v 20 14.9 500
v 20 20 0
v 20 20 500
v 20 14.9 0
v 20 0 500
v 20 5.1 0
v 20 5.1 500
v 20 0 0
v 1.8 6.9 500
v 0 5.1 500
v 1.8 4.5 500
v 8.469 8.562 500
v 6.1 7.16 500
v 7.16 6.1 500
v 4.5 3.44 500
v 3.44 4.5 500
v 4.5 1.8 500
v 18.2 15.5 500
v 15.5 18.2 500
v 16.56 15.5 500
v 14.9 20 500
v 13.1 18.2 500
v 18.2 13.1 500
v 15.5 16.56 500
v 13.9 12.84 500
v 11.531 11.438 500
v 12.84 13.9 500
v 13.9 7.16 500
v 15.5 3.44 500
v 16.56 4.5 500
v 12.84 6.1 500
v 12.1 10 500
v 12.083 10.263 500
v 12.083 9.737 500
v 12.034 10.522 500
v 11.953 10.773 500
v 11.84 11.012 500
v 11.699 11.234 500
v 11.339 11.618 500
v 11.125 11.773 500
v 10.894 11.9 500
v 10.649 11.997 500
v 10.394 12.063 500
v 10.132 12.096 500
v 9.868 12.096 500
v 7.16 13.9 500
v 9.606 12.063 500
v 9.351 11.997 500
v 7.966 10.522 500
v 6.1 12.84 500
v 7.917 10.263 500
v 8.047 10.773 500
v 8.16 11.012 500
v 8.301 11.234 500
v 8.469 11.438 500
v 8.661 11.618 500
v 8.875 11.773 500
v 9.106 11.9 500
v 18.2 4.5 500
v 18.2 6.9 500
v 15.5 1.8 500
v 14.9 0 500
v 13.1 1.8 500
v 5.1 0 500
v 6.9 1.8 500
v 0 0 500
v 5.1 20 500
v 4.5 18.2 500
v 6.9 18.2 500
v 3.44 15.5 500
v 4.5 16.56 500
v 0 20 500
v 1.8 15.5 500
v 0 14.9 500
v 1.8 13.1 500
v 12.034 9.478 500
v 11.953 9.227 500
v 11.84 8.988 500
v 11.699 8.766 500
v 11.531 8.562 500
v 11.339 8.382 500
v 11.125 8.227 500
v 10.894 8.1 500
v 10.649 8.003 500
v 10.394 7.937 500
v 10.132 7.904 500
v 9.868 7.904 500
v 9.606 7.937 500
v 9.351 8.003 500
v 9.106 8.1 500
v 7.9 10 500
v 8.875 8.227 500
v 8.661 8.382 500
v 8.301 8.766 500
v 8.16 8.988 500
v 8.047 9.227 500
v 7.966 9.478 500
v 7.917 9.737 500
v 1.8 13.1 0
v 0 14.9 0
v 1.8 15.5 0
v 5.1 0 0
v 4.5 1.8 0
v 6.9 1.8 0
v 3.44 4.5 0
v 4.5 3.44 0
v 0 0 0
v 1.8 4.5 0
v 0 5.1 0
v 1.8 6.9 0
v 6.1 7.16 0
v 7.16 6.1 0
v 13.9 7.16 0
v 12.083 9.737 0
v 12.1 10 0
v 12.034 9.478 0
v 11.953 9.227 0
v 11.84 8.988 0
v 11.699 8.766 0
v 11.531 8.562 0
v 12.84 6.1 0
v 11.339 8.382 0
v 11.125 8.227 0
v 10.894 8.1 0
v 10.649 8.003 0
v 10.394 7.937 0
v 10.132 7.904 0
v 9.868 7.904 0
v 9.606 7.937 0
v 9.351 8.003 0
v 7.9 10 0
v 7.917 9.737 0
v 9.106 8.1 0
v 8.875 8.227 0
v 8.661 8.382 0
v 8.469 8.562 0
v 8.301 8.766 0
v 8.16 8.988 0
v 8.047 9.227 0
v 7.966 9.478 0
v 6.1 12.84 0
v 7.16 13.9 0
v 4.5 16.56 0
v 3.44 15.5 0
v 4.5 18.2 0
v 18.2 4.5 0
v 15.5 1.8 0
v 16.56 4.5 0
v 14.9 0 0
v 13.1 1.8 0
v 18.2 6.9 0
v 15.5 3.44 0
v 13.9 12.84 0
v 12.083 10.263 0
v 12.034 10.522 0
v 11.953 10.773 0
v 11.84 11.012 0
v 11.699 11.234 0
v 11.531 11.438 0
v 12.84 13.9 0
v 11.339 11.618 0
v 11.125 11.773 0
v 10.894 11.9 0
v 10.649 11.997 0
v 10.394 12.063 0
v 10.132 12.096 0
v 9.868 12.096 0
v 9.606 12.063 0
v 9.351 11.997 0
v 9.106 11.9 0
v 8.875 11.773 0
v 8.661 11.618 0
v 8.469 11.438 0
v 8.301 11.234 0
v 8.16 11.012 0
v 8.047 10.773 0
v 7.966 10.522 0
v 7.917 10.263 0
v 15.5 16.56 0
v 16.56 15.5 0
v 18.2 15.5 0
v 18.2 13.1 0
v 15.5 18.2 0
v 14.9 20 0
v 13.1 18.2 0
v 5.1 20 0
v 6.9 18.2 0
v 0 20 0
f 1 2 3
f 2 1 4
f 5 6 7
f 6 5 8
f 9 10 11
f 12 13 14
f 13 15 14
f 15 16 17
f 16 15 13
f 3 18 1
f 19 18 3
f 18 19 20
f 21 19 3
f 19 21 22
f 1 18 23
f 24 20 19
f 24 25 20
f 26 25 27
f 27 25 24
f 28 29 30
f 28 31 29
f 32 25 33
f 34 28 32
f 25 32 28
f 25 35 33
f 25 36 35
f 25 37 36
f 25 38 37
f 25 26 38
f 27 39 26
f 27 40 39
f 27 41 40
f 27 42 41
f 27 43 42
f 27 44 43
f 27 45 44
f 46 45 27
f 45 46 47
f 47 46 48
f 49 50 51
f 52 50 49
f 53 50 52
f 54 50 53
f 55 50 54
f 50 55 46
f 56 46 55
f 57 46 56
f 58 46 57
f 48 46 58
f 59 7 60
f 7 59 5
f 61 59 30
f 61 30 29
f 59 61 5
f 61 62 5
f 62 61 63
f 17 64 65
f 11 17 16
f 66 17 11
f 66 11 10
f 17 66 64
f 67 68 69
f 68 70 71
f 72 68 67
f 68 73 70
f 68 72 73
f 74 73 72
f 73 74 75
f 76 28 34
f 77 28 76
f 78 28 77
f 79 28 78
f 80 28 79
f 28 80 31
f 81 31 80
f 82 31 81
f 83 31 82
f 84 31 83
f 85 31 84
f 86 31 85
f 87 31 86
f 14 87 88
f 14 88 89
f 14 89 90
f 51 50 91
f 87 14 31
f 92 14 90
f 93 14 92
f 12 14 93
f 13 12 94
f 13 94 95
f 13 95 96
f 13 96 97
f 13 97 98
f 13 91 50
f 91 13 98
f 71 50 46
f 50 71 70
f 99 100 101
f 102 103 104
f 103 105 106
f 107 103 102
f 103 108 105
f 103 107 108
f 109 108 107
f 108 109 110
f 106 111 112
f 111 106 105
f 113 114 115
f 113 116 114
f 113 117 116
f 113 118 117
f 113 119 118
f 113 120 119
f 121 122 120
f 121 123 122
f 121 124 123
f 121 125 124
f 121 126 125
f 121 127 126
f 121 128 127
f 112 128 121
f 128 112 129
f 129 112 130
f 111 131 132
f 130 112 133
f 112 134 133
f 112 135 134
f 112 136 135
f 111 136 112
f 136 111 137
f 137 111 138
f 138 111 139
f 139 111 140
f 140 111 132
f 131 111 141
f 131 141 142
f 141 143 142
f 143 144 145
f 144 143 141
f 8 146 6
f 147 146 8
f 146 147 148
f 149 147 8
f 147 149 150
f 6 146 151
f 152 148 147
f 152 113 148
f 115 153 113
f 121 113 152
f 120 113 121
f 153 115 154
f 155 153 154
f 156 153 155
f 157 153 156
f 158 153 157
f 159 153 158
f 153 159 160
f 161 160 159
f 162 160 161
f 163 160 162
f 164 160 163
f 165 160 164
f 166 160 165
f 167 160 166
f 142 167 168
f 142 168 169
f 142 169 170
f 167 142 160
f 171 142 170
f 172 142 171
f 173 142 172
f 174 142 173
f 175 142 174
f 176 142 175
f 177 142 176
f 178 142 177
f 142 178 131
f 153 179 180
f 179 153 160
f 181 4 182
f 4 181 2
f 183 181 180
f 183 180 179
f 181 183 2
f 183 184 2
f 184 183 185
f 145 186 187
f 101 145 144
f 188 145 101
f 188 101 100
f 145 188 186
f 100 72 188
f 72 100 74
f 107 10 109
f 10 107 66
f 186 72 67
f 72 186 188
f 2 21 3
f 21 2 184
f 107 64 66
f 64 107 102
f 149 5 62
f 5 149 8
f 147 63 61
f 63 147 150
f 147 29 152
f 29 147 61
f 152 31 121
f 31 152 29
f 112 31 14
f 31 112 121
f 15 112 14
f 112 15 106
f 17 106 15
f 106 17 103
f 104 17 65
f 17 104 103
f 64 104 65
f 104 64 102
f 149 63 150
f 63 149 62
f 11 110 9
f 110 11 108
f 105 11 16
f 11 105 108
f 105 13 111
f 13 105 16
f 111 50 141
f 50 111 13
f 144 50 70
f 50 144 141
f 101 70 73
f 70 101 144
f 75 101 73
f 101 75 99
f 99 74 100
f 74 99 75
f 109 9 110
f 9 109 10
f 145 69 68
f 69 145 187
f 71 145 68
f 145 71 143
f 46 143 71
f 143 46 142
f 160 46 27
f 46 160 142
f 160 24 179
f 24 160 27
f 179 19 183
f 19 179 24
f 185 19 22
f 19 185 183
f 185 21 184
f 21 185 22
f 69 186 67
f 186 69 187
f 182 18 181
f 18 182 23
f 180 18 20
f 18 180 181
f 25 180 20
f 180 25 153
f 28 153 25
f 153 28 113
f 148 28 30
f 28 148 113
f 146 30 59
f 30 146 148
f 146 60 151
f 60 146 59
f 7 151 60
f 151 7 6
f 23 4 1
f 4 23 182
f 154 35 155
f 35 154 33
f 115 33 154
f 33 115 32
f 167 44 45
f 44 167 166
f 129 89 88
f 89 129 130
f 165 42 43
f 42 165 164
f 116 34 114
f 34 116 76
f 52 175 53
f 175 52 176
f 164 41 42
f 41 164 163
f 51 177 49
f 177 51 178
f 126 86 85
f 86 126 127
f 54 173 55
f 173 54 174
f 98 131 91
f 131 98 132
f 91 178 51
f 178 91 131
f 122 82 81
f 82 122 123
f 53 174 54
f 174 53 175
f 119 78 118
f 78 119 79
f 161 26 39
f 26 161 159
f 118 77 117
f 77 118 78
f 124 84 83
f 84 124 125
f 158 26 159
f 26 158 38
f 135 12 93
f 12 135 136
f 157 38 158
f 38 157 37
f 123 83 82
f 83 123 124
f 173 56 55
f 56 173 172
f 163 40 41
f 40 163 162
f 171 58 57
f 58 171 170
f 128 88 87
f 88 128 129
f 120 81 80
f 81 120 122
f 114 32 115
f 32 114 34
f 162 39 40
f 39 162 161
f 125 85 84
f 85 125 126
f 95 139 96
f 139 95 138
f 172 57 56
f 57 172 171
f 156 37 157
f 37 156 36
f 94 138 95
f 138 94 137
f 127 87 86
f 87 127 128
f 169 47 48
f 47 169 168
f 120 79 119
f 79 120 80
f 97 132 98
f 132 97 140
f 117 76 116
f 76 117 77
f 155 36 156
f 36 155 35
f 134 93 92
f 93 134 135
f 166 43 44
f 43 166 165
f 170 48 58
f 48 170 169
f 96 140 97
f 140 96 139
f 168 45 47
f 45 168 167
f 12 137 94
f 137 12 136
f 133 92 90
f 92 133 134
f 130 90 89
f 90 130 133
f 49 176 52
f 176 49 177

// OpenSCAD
// Generated by SolidPython 1.1.3 on 2022-04-28 23:56:22


difference() {
	cube(size = [20.0000000000, 20.0000000000, 500]);
	translate(v = [5.1000000000, 0, 0]) {
		linear_extrude(center = false, convexity = 10, height = 500, twist = 0) {
			polygon(points = [[0.0000000000, 0.0000000000], [1.8000000000, 1.8000000000], [-0.6000000000, 1.8000000000], [-0.6000000000, 3.4400000000], [2.0600000000, 6.1000000000], [7.7400000000, 6.1000000000], [10.4000000000, 3.4400000000], [10.4000000000, 1.8000000000], [8, 1.8000000000], [9.8000000000, 0.0000000000], [0.0000000000, 0.0000000000]]);
		}
	}
	translate(v = [0, 14.9000000000, 0]) {
		rotate(a = [0, 0, 270]) {
			linear_extrude(center = false, convexity = 10, height = 500, twist = 0) {
				polygon(points = [[0.0000000000, 0.0000000000], [1.8000000000, 1.8000000000], [-0.6000000000, 1.8000000000], [-0.6000000000, 3.4400000000], [2.0600000000, 6.1000000000], [7.7400000000, 6.1000000000], [10.4000000000, 3.4400000000], [10.4000000000, 1.8000000000], [8, 1.8000000000], [9.8000000000, 0.0000000000], [0.0000000000, 0.0000000000]]);
			}
		}
	}
	translate(v = [14.9000000000, 0, 0]) {
		translate(v = [0, 20.0000000000, 0]) {
			rotate(a = [0, 0, 180]) {
				linear_extrude(center = false, convexity = 10, height = 500, twist = 0) {
					polygon(points = [[0.0000000000, 0.0000000000], [1.8000000000, 1.8000000000], [-0.6000000000, 1.8000000000], [-0.6000000000, 3.4400000000], [2.0600000000, 6.1000000000], [7.7400000000, 6.1000000000], [10.4000000000, 3.4400000000], [10.4000000000, 1.8000000000], [8, 1.8000000000], [9.8000000000, 0.0000000000], [0.0000000000, 0.0000000000]]);
				}
			}
		}
	}
	translate(v = [20.0000000000, 0, 0]) {
		translate(v = [0, 5.1000000000, 0]) {
			rotate(a = [0, 0, 90]) {
				linear_extrude(center = false, convexity = 10, height = 500, twist = 0) {
					polygon(points = [[0.0000000000, 0.0000000000], [1.8000000000, 1.8000000000], [-0.6000000000, 1.8000000000], [-0.6000000000, 3.4400000000], [2.0600000000, 6.1000000000], [7.7400000000, 6.1000000000], [10.4000000000, 3.4400000000], [10.4000000000, 1.8000000000], [8, 1.8000000000], [9.8000000000, 0.0000000000], [0.0000000000, 0.0000000000]]);
				}
			}
		}
	}
	translate(v = [0, 10.0000000000, 0]) {
		translate(v = [10.0000000000, 0, 0]) {
			cylinder($fn = 50, h = 500, r = 2.1000000000);
		}
	}
}
/***********************************************
*********      SolidPython code:      **********
************************************************
 
from solid import *
from solid.utils import *  # Not required, but the utils module is useful

GROOVE_WIDTH = 9.8

def make_groove(height):
    # Define the shape of the vslot grooves as a polygon.
    groove_points = [
        [0.0, 0.0, 0.0],
        [1.8, 1.8, 0.0],
        [-0.6, 1.8, 0.0],
        [-0.6, 3.44, 0.0],
        [2.06, 6.1, 0.0],
        [7.74, 6.1, 0.0],
        [10.4, 3.44, 0.0],
        [10.4, 1.8, 0.0],
        [8, 1.8, 0.0],
        [9.8, 0.0, 0.0],
        [0.0, 0.0, 0.0],
    ];

    # Extrude the groove polygon into a 3d object.
    return linear_extrude(height = height, center = False, convexity = 10, twist = 0)(
        polygon(groove_points)
    );

def make_2020(height):
    # Overall dimensions
    side = 20.0;

    translate_dist = (side/2) - (GROOVE_WIDTH/2);

    bottom_groove = right(translate_dist)(
        make_groove(height)
    );

    left_groove = forward(translate_dist + GROOVE_WIDTH)(
        rotate([0, 0, 270])(
            make_groove(height)
        )
    );

    top_groove = right(translate_dist + GROOVE_WIDTH)(
        forward(side)(
            rotate([0, 0, 180])(
                make_groove(height)
            )
        )
    );
    
    right_groove = right(side)(
        forward(translate_dist)(
            rotate([0, 0, 90])(
                make_groove(height)
            )
        )
    );

    center_hole = forward(side/2)(
        right(side/2)(
            cylinder(h=height, r=2.1, segments=50)
        )
    );

    return cube([side, side, height]) - bottom_groove - left_groove - top_groove - right_groove - center_hole;

# Test renders
scad_render_to_file(make_2020(250), '../../scad/vslot2020_250mm.scad');
scad_render_to_file(make_2020(500), '../../scad/vslot2020_500mm.scad');
scad_render_to_file(make_2020(1000), '../../scad/vslot2020_1000mm.scad');
scad_render_to_file(make_2020(1500), '../../scad/vslot2020_1500mm.scad');
scad_render_to_file(make_2020(2000), '../../scad/vslot2020_2000mm.scad');
scad_render_to_file(make_groove(250), '../../scad/vslotgroove.scad'); 
 
************************************************/
